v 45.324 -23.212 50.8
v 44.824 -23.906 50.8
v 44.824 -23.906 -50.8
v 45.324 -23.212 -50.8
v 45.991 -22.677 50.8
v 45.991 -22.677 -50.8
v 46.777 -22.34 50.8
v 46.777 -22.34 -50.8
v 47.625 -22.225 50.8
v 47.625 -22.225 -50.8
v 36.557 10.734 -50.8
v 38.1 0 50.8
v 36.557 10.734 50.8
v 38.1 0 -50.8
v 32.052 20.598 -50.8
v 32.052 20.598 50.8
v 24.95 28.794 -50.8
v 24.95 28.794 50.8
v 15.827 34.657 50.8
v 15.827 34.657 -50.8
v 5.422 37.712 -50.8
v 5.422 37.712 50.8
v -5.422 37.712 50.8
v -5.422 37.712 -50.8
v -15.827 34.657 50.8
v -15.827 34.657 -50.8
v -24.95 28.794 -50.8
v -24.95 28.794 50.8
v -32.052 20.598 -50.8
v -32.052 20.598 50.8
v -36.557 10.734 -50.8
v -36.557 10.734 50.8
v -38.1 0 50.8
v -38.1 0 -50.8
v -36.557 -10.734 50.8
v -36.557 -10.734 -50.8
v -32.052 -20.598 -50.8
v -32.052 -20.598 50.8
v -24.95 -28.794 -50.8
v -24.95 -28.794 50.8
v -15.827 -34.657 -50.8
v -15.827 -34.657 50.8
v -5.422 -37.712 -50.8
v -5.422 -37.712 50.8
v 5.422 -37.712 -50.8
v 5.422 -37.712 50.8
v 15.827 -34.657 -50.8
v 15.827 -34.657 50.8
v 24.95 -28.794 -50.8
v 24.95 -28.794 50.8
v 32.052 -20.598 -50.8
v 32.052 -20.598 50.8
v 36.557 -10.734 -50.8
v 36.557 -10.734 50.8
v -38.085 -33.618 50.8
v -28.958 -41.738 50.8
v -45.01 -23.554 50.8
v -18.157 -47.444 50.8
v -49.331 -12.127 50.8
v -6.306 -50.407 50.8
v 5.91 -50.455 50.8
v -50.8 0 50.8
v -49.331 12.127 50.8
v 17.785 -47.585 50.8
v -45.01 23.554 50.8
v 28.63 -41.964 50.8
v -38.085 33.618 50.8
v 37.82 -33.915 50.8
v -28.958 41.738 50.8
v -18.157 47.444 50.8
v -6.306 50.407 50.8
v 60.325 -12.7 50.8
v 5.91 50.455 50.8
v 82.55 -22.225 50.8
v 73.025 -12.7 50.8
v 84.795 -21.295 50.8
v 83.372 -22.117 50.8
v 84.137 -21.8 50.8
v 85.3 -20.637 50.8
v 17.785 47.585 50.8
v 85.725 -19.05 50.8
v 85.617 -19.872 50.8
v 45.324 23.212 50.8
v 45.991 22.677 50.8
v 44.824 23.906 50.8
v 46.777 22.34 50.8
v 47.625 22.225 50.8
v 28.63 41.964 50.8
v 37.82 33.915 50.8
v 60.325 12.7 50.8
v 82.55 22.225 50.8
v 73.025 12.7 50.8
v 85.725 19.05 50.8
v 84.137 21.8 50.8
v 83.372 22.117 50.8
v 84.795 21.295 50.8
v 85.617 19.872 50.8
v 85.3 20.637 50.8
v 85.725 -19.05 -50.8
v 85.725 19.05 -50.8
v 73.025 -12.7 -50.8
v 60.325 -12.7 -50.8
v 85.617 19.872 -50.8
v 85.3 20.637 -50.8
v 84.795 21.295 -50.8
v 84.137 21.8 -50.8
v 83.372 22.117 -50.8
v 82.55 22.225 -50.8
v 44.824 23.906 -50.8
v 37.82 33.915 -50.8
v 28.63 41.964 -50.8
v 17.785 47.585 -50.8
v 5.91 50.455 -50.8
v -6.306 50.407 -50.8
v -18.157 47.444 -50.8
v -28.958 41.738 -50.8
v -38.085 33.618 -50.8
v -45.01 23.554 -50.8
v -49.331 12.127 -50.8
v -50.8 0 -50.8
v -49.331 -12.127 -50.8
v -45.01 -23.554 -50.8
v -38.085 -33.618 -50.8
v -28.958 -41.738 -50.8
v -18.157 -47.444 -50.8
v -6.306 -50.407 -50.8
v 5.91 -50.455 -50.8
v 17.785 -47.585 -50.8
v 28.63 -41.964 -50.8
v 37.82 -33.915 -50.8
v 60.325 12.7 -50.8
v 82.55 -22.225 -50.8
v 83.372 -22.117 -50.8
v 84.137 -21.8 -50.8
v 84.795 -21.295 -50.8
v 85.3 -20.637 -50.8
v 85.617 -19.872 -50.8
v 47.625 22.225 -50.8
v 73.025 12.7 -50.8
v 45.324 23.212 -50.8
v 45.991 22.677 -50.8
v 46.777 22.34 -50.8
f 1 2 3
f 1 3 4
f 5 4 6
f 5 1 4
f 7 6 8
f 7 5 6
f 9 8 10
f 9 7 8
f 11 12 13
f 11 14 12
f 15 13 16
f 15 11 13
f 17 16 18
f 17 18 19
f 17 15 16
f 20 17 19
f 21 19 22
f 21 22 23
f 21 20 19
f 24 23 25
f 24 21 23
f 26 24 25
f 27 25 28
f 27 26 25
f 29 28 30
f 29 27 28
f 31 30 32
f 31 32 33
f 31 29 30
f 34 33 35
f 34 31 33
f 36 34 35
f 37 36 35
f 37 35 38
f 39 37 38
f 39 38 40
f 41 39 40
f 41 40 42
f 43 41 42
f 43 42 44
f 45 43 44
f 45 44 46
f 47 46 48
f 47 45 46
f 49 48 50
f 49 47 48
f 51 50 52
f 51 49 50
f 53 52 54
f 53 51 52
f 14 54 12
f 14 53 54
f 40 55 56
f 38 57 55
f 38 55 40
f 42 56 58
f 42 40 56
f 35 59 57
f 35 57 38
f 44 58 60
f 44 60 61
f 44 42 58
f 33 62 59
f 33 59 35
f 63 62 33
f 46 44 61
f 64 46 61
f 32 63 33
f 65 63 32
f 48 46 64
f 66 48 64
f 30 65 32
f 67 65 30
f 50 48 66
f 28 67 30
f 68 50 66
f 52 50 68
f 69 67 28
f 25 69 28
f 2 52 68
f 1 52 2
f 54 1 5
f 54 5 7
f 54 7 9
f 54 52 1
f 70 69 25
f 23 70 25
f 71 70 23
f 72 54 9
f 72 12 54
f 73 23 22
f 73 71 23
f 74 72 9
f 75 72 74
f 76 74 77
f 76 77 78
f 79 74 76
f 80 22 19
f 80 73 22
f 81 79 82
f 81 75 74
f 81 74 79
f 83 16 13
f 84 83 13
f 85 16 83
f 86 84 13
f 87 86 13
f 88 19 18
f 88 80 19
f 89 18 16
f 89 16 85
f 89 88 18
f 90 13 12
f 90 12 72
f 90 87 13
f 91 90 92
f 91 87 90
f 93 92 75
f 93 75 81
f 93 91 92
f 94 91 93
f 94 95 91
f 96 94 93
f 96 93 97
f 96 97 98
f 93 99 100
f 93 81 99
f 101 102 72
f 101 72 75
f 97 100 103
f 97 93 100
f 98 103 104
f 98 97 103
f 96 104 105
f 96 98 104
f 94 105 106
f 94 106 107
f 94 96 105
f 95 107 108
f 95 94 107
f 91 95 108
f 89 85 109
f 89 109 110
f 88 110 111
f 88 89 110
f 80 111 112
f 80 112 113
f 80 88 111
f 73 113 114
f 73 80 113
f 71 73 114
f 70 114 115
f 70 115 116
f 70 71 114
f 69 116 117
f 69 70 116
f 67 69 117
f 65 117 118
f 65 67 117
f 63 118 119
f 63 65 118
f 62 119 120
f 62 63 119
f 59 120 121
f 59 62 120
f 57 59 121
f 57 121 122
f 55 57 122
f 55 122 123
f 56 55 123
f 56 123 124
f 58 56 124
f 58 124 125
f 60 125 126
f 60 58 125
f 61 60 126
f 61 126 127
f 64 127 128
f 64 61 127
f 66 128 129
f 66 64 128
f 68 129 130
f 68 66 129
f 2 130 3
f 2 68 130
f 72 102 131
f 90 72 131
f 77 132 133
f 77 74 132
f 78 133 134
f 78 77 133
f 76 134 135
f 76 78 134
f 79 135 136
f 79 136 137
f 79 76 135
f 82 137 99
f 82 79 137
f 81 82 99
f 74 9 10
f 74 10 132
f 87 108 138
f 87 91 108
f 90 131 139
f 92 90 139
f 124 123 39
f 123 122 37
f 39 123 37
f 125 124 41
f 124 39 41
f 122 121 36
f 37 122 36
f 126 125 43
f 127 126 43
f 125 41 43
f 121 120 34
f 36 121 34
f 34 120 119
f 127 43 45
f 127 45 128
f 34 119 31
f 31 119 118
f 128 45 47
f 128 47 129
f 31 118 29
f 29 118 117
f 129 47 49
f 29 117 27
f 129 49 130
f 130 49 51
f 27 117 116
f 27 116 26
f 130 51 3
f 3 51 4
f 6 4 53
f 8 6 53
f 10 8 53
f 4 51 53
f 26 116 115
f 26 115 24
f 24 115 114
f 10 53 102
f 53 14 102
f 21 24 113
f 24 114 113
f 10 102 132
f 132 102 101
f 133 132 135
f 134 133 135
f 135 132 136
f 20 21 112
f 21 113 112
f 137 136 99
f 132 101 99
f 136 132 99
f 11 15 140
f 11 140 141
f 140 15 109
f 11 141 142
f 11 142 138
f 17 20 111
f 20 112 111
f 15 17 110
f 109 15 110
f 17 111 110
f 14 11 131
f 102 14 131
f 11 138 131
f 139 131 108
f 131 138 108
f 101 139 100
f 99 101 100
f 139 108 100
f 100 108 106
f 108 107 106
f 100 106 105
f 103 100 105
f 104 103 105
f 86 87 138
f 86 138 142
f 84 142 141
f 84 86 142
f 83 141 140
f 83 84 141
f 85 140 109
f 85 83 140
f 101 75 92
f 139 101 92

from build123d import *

# Parameters (mm, degrees)
F0_R     = 38.1
F0_W     = 12.7
F0_H     = 25.4
F1_DEPTH = 50.8


with BuildPart() as f1:
    # F0 (on Top) → F1 (new body, symmetric)
    with BuildSketch(Plane.XY):
        with BuildLine():
            Line((82.55, 22.225), (47.625, 22.225))
            ThreePointArc((47.625, 22.225), (45.991476, 22.67746), (44.823529, 23.905882))
            ThreePointArc((44.823529, 23.905882), (-50.8, 0), (44.823529, -23.905882))
            ThreePointArc((44.823529, -23.905882), (45.991476, -22.67746), (47.625, -22.225))
            Line((47.625, -22.225), (82.55, -22.225))
            ThreePointArc((82.55, -22.225), (84.795064, -21.295064), (85.725, -19.05))
            Line((85.725, -19.05), (85.725, 19.05))
            ThreePointArc((85.725, 19.05), (84.795064, 21.295064), (82.55, 22.225))
        make_face()
        Circle(F0_R, mode=Mode.SUBTRACT)
        with Locations((66.675, 0)):
            Rectangle(F0_W, F0_H, mode=Mode.SUBTRACT)
    extrude(amount=F1_DEPTH, both=True)


solid = f1.part
